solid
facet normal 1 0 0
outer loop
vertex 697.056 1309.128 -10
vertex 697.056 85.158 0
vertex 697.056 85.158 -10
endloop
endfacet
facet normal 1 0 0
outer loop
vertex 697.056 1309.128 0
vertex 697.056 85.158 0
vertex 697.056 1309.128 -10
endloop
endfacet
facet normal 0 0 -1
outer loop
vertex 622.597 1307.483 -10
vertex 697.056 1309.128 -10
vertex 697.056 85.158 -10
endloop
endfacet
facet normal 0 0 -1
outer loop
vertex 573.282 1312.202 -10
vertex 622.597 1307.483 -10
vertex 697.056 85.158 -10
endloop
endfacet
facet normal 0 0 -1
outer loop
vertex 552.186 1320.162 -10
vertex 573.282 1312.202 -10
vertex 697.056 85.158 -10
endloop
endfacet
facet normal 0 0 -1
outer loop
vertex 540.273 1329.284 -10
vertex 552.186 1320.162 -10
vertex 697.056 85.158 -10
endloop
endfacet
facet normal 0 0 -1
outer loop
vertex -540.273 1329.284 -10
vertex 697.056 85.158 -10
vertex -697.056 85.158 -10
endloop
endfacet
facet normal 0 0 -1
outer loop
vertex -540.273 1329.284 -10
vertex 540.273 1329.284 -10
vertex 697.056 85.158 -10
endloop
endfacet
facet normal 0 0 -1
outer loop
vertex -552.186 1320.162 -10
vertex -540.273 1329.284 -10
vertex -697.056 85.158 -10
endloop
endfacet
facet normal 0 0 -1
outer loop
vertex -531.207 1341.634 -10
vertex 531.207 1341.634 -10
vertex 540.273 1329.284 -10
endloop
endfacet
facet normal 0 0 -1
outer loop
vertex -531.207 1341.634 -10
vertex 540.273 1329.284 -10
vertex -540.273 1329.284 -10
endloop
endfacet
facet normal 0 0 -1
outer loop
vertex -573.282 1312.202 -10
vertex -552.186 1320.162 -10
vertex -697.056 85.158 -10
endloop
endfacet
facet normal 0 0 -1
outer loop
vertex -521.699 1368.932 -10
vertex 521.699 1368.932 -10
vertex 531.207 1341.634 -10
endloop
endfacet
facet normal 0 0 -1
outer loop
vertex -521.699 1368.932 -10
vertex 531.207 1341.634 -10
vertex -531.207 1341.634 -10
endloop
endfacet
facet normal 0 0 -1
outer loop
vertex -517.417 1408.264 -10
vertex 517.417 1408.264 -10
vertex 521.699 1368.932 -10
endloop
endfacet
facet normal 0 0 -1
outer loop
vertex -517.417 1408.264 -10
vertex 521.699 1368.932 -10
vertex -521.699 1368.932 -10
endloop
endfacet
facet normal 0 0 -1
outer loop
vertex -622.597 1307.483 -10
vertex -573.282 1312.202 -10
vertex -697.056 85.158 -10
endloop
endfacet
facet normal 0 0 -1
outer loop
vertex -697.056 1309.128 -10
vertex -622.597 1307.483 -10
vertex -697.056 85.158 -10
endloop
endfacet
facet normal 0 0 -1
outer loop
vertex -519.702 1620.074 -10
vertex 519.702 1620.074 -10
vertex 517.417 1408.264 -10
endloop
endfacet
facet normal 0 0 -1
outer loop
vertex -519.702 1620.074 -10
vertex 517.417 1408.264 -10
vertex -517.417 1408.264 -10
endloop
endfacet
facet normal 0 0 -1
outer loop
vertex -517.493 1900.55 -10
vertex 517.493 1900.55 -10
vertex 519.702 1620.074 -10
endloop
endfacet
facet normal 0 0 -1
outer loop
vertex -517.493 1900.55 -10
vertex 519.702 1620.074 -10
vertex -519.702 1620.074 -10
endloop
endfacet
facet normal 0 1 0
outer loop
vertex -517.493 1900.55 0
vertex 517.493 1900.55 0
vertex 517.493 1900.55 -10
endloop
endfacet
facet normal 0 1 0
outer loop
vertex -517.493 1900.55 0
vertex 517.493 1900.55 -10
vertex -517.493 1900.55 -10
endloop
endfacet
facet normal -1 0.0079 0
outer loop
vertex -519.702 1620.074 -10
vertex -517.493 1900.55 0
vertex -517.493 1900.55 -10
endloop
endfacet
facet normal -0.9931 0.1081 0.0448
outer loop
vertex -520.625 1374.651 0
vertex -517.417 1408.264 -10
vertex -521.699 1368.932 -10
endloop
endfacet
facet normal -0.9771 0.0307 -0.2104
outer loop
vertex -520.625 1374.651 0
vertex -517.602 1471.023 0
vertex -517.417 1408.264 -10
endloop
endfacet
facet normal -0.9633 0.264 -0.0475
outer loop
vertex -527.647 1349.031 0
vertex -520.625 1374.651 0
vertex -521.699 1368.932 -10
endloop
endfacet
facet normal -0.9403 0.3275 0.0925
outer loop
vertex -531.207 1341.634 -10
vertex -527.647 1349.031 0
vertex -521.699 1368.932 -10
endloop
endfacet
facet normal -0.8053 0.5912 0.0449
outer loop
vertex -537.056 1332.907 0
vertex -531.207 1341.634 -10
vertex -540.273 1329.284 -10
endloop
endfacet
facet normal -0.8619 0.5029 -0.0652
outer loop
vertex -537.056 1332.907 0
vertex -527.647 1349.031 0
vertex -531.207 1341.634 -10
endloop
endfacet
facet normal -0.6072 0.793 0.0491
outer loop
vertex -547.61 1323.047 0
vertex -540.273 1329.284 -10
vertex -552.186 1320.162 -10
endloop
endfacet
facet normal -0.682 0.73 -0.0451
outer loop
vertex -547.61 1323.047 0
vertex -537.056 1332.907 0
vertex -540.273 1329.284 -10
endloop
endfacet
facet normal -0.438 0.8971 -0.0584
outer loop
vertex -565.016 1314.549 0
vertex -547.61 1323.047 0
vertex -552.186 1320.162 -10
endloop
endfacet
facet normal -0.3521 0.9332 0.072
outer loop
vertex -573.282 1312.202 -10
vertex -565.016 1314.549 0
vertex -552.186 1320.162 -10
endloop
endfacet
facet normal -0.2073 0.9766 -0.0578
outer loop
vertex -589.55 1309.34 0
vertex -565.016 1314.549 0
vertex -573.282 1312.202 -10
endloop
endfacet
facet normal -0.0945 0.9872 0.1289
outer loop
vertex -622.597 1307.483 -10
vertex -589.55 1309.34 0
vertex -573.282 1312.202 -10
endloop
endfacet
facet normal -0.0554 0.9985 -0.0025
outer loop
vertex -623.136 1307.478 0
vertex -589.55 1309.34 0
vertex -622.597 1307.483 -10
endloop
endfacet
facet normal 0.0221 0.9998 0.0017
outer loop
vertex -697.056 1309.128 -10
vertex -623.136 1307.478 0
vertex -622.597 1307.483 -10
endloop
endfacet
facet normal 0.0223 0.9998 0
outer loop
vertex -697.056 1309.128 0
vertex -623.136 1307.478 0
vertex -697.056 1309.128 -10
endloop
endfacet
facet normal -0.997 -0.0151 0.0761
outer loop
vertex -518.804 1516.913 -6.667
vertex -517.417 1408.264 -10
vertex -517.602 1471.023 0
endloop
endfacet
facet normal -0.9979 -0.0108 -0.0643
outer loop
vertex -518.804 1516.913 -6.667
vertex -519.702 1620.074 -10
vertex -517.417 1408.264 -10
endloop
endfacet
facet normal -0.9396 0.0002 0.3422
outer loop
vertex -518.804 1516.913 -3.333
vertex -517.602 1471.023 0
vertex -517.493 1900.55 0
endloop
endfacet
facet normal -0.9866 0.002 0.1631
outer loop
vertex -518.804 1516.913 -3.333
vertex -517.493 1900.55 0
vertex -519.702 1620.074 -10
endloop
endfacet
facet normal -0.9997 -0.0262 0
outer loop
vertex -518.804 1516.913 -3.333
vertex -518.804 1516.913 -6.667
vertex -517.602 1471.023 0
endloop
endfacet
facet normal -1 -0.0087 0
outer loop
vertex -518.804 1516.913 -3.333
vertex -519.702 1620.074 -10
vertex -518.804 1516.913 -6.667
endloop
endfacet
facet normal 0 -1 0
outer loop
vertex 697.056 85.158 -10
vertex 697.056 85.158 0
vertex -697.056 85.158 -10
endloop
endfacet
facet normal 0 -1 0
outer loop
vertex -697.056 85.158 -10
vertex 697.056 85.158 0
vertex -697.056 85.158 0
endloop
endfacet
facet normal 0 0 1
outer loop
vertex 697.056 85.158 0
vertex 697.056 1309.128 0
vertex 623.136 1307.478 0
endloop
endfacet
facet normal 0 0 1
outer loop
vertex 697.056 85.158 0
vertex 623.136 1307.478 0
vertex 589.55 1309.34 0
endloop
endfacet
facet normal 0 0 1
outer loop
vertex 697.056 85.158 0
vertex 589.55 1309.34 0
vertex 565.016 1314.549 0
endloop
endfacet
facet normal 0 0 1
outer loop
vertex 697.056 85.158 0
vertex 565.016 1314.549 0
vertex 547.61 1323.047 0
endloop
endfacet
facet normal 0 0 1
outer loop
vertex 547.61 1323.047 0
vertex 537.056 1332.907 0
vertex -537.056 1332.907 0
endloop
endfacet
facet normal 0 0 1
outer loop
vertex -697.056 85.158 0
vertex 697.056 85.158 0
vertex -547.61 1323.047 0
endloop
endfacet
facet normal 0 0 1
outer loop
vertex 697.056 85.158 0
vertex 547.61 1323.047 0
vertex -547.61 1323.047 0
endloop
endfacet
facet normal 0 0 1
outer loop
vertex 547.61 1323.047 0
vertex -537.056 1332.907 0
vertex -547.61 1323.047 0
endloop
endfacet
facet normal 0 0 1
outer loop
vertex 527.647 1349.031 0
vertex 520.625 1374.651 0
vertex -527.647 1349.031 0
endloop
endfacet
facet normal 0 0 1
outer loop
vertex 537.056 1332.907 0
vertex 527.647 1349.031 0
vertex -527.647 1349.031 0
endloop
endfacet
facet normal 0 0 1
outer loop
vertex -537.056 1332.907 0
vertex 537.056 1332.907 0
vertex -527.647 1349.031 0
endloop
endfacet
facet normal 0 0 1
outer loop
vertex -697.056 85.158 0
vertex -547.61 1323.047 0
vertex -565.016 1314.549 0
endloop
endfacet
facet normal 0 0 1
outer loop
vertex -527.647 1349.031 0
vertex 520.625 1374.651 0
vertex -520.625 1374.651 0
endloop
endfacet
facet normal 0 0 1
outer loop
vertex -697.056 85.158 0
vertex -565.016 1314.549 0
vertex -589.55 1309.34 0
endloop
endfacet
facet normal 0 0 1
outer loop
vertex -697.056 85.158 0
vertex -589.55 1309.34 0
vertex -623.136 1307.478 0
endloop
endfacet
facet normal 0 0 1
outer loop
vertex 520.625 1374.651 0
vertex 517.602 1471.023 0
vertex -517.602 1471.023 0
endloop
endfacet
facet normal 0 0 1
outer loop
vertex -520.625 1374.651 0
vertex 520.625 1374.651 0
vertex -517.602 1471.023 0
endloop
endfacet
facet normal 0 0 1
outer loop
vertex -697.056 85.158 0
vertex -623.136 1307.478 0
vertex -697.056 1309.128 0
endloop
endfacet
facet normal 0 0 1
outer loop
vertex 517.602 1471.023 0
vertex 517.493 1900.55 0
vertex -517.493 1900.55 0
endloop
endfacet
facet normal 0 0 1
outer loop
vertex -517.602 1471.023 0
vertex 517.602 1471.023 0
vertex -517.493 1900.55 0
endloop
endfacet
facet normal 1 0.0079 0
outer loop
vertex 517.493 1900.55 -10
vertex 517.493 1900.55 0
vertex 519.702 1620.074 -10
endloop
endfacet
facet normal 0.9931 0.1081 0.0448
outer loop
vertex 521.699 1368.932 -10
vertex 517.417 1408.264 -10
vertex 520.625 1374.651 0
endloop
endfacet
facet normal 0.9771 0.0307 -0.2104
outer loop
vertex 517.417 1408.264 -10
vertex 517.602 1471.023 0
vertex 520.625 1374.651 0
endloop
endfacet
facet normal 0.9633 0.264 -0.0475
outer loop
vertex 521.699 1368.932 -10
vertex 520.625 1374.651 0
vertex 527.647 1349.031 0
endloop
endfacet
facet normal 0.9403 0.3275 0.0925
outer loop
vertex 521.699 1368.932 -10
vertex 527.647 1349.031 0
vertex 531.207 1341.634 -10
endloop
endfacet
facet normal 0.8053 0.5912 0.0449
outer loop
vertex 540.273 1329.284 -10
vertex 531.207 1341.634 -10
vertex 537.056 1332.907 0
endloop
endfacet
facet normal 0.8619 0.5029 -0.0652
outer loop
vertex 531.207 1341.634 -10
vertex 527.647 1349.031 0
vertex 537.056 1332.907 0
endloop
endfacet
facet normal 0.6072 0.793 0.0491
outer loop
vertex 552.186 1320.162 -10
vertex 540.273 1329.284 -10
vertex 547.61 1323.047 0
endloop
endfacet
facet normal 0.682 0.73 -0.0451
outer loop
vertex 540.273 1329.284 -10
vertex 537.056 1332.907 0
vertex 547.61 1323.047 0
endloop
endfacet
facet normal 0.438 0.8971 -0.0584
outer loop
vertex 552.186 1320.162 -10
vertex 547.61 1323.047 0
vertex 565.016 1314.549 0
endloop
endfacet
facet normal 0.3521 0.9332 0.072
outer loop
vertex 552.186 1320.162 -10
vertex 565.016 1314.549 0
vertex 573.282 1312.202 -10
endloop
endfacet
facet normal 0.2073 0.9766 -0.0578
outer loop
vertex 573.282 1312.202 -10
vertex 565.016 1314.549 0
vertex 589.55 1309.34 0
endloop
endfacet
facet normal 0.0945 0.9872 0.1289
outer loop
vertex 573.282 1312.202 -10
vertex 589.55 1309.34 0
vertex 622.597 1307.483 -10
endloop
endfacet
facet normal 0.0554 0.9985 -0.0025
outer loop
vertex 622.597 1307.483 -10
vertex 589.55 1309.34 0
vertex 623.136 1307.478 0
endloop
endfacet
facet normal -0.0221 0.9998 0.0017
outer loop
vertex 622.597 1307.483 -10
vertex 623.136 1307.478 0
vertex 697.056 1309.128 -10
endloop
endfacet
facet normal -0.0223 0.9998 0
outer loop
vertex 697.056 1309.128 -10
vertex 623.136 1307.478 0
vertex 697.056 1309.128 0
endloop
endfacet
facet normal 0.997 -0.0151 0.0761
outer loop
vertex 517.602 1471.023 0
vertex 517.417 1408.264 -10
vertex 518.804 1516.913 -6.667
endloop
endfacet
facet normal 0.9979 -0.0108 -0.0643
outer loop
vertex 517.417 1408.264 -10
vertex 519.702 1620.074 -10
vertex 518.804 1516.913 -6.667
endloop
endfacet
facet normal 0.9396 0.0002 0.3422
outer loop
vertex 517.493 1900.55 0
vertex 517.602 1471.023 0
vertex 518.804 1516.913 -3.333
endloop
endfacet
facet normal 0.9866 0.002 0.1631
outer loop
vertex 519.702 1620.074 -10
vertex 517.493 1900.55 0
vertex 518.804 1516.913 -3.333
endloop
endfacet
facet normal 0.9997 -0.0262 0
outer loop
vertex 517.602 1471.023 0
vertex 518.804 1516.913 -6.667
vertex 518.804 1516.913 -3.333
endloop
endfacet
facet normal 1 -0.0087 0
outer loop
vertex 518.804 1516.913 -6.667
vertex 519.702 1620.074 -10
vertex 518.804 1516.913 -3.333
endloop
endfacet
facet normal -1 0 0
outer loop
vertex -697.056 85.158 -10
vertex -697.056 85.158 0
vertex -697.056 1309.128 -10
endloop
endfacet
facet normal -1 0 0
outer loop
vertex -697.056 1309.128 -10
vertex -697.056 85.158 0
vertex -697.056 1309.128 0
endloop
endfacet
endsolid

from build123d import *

# Parameters (mm, degrees)
F0_W     = 697.0556974411
F0_H     = 1815.3920248151
F1_DEPTH = 10
F3_DEPTH = 660


with BuildPart() as f1:
    # F0 (on Top) → F1 (new body)
    with BuildSketch(Plane.XY):
        with Locations((348.5278487206, 992.8541146219)):
            Rectangle(F0_W, F0_H)
    extrude(amount=-F1_DEPTH)

    # F2 (on face) → F3 (cut)
    with BuildSketch(Plane.XY):
        with BuildLine():
            add(Edge.make_bspline(
                [(518.803774091, 2038.8926588478), (514.4141140373, 1900.5501270294), (527.0135085035, 1534.9048792953), (504.258722184, 1284.8443561216), (652.2567457375, 1310.686684836), (731.5574045275, 1309.2447331839)],
                knots=[0, 0, 0, 0, 0.4528842523, 0.7287221415, 1, 1, 1, 1], degree=3))
            Line((731.5574045275, 1309.2447331839), (731.5574045275, 2029.0073490817))
            Line((731.5574045275, 2029.0073490817), (518.803774091, 2038.8926588478))
        make_face()
    extrude(amount=-F3_DEPTH, mode=Mode.SUBTRACT)

    # F4: F1 across plane


with BuildPart() as f1_1:
    add(f1.part)
    add(f1.part.mirror(Plane.YZ))


solid = f1_1.part
